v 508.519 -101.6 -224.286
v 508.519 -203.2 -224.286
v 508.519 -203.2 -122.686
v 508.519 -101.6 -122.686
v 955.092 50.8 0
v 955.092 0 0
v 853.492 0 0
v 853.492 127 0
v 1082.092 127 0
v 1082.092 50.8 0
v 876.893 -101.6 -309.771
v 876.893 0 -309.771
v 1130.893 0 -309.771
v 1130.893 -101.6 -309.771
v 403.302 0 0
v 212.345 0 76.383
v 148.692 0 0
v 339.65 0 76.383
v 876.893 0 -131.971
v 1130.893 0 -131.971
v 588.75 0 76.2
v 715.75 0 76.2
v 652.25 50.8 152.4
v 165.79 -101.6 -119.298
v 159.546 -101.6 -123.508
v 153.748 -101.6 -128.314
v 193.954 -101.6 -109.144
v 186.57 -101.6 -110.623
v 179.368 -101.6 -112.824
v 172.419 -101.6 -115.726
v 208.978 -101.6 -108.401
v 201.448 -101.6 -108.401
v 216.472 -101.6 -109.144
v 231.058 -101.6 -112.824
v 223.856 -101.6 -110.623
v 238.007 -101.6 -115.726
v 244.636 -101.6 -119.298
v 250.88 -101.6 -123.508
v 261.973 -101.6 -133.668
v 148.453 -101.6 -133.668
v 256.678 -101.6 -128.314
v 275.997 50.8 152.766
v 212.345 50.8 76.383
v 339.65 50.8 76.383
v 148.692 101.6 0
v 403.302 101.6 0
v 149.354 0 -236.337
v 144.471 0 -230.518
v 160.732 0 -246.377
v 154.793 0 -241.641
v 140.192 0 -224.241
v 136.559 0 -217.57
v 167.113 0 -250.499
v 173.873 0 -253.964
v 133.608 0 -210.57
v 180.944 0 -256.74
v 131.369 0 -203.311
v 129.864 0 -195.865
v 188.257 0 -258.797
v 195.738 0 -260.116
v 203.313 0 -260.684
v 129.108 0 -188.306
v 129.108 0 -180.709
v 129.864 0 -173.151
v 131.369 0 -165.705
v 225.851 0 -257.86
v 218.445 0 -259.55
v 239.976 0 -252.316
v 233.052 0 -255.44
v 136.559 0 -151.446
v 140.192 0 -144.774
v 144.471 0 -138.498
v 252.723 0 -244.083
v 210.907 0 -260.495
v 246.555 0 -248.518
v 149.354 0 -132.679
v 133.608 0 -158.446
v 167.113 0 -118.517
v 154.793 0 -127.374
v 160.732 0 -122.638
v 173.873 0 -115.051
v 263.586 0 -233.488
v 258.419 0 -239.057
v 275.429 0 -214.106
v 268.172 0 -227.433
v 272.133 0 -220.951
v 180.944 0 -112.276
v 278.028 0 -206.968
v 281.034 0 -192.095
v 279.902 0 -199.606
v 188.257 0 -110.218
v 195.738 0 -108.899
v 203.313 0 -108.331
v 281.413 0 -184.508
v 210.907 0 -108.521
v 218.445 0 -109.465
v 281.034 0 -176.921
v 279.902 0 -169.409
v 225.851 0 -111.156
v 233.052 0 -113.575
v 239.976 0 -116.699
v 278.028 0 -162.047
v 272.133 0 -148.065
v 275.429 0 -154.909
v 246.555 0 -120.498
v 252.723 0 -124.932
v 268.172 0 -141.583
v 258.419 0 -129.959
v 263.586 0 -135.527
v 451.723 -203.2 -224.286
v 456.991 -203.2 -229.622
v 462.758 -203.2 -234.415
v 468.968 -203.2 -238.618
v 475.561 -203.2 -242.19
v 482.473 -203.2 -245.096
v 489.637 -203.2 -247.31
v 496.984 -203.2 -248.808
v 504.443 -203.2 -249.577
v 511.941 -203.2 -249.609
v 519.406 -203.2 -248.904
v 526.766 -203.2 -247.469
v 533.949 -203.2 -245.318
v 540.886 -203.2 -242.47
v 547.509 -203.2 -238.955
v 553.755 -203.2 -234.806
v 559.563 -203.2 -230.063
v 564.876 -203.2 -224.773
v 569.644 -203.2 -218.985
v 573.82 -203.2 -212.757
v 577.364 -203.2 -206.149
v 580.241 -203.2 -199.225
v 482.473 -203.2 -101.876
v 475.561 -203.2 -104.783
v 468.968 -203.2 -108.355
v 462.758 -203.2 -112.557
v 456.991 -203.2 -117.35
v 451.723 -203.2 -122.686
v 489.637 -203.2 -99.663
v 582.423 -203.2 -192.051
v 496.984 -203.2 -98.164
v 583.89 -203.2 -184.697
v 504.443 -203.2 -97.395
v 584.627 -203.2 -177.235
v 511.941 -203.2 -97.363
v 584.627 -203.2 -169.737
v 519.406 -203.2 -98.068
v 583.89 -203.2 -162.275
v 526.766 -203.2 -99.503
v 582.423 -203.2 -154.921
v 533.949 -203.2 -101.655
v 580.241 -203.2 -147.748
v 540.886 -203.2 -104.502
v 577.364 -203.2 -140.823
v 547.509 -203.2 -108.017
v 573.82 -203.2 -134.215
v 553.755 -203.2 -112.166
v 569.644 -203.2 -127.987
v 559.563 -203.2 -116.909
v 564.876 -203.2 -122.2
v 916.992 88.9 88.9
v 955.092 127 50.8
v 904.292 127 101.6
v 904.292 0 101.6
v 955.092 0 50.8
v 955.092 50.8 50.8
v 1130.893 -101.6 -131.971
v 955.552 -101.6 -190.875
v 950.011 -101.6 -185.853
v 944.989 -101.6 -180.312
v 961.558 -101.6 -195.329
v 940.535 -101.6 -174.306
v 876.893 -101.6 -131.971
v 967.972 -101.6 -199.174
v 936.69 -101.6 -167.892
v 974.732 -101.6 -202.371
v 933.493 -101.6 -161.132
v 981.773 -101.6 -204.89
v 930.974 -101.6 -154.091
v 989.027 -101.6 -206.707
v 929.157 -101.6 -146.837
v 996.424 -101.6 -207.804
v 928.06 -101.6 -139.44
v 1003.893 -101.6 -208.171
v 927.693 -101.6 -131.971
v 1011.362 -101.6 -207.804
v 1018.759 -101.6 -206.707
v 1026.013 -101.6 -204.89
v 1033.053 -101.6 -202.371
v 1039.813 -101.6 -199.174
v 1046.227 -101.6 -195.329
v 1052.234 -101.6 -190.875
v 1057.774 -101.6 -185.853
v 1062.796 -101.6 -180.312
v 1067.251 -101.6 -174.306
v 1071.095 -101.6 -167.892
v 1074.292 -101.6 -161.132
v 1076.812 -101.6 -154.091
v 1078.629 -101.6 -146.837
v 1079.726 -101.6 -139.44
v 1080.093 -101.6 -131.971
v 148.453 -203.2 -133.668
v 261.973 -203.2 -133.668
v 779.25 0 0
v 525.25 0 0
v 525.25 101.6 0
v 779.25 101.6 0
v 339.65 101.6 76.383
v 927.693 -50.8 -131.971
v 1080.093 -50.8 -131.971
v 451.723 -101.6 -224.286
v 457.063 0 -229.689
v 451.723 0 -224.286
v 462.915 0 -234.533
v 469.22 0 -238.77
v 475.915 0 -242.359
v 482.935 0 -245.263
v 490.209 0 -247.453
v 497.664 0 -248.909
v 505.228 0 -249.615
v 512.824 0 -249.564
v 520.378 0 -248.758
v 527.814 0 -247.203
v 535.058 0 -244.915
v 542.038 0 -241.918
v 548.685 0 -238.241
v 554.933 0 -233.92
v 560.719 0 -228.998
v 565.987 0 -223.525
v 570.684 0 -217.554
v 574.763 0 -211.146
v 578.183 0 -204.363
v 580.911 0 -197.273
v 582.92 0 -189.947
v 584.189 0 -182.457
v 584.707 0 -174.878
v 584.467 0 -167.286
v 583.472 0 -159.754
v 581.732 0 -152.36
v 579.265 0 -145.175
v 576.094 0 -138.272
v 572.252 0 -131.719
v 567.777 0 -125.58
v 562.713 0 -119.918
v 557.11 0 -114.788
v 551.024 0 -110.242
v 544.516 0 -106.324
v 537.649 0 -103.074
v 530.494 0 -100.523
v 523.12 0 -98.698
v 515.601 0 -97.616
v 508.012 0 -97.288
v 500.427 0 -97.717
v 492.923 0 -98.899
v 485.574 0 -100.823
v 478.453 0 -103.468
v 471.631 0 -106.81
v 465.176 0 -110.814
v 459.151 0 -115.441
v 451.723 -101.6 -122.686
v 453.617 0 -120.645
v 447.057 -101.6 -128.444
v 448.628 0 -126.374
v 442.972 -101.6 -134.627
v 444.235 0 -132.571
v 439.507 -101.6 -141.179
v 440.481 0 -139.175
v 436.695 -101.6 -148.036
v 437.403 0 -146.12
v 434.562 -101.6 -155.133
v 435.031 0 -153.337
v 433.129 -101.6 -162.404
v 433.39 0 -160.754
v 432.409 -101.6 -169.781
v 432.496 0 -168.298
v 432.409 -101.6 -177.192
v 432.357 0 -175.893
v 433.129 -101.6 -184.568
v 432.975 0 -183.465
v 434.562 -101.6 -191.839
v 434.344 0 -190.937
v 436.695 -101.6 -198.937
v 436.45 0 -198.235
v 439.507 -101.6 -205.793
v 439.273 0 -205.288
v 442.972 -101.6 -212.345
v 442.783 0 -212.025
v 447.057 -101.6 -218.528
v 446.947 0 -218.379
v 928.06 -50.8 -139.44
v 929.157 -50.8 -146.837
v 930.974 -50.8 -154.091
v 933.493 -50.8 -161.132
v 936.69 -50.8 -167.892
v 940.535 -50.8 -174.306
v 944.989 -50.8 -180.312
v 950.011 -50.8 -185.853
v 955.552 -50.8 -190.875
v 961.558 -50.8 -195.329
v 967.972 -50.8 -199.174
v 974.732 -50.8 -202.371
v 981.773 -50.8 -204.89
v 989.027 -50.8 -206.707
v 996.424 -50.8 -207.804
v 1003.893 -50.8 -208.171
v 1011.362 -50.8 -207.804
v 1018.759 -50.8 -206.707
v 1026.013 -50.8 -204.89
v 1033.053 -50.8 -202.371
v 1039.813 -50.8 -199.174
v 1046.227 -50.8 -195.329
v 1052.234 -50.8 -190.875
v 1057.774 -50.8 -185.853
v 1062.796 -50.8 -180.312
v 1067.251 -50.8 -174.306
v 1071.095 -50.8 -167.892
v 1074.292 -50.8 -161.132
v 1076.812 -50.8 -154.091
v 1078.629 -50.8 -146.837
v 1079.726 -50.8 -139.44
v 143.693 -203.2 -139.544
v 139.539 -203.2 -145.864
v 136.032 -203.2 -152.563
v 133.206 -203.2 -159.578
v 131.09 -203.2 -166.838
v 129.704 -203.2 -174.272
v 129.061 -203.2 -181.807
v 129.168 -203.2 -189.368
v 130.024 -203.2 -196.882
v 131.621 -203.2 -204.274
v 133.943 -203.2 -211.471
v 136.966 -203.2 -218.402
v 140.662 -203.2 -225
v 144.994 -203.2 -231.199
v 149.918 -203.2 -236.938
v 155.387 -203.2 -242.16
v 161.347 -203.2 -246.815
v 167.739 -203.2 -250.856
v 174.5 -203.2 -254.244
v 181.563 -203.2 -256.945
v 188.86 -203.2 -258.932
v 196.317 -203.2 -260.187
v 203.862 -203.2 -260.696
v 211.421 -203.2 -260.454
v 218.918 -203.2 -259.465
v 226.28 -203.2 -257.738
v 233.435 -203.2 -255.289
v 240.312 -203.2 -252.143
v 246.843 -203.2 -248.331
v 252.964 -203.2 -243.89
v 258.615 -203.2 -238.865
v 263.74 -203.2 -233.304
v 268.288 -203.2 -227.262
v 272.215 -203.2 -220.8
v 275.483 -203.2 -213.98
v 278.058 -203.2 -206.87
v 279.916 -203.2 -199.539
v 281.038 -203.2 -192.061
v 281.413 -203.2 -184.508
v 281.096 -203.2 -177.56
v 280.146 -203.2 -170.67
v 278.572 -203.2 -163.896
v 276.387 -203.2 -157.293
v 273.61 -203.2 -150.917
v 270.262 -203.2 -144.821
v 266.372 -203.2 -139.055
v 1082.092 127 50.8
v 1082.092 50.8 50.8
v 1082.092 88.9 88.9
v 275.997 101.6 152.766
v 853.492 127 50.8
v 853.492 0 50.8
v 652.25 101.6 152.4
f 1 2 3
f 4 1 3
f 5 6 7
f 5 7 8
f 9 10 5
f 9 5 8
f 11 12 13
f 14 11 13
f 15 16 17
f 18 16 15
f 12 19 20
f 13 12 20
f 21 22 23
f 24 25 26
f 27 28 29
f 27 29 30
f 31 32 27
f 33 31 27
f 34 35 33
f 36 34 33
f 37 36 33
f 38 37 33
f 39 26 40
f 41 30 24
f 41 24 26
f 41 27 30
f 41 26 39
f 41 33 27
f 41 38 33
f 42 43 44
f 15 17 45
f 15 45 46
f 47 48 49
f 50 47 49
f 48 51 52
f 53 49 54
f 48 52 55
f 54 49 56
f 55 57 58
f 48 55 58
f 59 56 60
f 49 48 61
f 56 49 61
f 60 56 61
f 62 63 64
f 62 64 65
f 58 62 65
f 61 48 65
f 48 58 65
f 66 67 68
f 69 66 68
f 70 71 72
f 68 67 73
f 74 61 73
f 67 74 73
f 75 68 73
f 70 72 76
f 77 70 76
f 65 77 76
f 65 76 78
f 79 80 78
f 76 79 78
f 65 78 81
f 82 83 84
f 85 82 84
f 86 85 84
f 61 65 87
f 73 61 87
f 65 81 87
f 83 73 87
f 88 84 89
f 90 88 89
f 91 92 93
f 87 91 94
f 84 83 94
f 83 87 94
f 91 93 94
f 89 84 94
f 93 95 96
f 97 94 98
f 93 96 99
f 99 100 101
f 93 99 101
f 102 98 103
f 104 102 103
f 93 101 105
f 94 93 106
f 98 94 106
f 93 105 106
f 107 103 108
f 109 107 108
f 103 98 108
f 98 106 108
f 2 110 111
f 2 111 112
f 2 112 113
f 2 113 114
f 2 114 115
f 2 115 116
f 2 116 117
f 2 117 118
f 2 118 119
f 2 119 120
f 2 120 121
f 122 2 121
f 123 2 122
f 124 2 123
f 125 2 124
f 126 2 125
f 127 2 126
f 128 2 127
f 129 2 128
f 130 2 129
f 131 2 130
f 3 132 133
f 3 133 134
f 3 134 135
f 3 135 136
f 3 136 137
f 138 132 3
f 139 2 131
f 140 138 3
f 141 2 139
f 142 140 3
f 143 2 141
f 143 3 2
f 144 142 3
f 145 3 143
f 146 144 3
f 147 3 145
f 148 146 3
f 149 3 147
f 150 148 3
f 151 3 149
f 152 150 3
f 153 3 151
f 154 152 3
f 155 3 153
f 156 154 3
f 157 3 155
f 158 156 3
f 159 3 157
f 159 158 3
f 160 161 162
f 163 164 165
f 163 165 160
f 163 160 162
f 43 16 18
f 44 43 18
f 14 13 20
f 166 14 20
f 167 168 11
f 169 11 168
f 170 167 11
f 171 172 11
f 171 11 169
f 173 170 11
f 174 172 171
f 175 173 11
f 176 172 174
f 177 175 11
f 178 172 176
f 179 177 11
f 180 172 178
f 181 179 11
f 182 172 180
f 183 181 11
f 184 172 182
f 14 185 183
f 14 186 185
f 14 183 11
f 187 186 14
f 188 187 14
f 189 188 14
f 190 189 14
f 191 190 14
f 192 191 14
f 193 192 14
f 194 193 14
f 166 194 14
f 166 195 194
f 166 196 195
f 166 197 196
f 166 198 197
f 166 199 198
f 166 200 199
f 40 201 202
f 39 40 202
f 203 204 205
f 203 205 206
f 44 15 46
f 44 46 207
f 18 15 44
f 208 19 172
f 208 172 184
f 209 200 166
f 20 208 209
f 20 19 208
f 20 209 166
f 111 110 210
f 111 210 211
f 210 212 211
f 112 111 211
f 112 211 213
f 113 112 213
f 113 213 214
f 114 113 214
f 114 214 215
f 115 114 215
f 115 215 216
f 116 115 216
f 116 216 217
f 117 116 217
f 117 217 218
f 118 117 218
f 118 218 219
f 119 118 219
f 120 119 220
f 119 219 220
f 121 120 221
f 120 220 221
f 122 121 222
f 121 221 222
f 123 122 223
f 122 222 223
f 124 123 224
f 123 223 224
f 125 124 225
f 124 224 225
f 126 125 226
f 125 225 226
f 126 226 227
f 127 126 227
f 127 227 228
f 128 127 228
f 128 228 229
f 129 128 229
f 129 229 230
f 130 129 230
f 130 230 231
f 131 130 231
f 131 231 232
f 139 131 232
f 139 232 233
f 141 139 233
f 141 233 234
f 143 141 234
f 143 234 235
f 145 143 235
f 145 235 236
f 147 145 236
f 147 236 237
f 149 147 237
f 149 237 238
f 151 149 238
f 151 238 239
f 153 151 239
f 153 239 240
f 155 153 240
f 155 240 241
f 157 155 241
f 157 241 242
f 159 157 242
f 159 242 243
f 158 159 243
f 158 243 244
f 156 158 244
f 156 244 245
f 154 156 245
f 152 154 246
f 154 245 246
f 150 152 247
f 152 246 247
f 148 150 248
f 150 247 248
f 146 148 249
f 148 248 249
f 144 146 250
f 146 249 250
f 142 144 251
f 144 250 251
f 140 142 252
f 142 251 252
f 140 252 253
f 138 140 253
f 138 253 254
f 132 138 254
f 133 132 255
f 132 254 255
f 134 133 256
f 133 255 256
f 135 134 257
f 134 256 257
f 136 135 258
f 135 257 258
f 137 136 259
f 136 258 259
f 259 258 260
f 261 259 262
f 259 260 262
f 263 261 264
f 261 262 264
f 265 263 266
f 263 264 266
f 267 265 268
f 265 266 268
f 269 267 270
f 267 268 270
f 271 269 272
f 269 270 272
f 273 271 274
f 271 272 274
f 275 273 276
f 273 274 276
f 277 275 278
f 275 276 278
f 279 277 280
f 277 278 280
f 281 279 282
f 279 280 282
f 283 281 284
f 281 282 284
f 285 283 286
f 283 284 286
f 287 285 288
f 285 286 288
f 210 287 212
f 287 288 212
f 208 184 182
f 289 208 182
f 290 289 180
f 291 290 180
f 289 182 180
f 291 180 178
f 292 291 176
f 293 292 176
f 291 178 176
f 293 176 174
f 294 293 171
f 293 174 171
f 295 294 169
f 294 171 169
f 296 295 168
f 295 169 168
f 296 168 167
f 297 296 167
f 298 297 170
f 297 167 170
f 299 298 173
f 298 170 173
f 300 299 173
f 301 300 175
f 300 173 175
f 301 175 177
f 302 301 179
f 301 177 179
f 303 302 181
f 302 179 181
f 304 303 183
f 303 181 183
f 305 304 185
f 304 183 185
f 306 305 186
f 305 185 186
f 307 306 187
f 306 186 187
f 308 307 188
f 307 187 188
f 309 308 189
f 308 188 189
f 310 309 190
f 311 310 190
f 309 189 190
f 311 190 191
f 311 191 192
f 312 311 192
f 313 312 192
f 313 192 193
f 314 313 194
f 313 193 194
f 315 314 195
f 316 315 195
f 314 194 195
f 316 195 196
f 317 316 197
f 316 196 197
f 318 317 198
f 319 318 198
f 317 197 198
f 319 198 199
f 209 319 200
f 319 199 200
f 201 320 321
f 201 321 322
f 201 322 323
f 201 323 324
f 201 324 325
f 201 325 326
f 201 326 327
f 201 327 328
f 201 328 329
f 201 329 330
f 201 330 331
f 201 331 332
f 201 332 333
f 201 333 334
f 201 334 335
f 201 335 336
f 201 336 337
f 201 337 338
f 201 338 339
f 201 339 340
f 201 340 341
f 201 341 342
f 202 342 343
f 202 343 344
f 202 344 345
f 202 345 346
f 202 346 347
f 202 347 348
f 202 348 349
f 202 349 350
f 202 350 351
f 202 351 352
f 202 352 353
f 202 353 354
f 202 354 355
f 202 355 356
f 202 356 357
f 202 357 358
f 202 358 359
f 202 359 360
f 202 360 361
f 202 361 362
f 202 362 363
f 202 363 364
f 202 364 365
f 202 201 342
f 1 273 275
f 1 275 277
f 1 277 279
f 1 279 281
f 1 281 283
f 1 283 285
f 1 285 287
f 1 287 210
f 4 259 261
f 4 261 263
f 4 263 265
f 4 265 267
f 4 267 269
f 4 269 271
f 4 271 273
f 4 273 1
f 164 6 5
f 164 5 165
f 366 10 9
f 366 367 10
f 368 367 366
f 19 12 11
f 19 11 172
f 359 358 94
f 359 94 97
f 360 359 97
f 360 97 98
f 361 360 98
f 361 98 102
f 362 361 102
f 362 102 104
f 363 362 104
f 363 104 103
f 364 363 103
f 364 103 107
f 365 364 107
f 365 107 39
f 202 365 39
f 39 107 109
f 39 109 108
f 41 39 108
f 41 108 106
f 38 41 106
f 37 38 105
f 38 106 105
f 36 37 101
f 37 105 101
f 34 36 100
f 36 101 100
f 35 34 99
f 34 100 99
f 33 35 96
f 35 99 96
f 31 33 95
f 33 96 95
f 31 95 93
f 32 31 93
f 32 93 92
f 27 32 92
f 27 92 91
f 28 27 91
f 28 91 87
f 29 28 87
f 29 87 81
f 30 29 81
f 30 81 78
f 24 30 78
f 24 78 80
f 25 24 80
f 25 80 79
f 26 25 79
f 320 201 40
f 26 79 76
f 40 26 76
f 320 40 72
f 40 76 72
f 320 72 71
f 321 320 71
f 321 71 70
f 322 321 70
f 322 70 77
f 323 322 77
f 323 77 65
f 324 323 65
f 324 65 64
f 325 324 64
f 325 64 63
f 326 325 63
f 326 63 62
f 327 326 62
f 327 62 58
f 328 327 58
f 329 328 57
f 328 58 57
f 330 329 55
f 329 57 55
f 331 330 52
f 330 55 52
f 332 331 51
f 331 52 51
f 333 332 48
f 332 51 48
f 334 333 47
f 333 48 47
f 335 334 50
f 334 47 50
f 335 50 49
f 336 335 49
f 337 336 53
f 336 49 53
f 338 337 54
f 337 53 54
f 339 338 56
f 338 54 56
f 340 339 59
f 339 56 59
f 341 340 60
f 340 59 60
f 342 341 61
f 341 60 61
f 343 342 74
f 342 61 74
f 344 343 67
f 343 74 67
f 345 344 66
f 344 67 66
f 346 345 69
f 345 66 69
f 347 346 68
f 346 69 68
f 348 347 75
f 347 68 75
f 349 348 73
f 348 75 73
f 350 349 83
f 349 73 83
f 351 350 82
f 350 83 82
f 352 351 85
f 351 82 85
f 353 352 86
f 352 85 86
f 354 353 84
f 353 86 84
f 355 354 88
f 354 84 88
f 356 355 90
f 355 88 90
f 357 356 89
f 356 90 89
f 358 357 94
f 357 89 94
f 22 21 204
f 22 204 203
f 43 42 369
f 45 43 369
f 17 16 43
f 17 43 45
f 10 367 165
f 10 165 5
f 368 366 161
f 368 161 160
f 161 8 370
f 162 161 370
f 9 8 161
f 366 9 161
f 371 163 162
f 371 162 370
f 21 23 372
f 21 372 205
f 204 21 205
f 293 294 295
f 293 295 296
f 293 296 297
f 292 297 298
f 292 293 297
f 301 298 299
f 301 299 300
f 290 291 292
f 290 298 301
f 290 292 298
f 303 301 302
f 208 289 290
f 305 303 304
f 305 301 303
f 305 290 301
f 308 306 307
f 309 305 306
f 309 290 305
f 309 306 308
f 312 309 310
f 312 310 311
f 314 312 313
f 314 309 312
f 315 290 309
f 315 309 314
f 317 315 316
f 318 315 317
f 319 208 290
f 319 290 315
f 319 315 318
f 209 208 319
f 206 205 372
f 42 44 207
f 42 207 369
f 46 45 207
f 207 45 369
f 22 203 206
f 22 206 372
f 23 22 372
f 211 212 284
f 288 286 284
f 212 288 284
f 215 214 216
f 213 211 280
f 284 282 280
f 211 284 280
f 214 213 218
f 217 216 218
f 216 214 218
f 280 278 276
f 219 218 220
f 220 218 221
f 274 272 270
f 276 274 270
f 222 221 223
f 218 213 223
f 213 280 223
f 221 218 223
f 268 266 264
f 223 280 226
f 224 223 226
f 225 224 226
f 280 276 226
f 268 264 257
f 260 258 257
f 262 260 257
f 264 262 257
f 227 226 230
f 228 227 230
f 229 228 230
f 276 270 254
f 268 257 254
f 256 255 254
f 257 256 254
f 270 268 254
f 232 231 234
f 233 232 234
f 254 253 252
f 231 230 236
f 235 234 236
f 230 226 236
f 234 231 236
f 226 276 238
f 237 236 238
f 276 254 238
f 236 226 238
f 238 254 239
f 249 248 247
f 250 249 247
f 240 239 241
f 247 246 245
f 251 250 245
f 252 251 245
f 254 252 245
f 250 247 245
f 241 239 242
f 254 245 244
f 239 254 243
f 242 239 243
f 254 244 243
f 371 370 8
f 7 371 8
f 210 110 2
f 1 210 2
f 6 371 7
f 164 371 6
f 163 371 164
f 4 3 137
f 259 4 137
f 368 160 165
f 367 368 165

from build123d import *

# Parameters (mm, degrees)
F1_DEPTH  = 101.6
F2_DEPTH  = 50.8
F3_DEPTH  = 101.6
F7_DEPTH  = 63.5
F9_DEPTH  = 127
F12_DEPTH = 165.1
F13_R     = 76.2
F14_DEPTH = 203.2
F16_DEPTH = 101.6
F18_DEPTH = 203.2
F20_DEPTH = 101.6
F21_W     = 254
F21_H     = 177.8
F22_DEPTH = 101.6
F24_DEPTH = 50.8


with BuildPart() as f1:
    # F0 (on Front) → F1 (new body)
    with BuildSketch(Plane.XZ):
        Polygon((275.9973074218, 152.7659382395), (212.3448331553, 76.3829691198), (339.6497816883, 76.3829691198), align=None)
        Polygon((212.3448331553, 76.3829691198), (148.6923588888, 0), (403.3022559547, 0), (339.6497816883, 76.3829691198), align=None)
    extrude(amount=-F1_DEPTH)

    # F0 (on Front) → F2 (cut)
    with BuildSketch(Plane.XZ):
        Polygon((275.9973074218, 152.7659382395), (212.3448331553, 76.3829691198), (339.6497816883, 76.3829691198), align=None)
    extrude(amount=-F2_DEPTH, mode=Mode.SUBTRACT)


with BuildPart() as f3:
    # F0 (on Front) → F3 (new body)
    with BuildSketch(Plane.XZ):
        Polygon((652.2500761549, 152.4), (588.7500761549, 76.2), (715.7500761549, 76.2), align=None)
        Polygon((588.7500761549, 76.2), (525.2500761549, 0), (779.2500761549, 0), (715.7500761549, 76.2), align=None)
    extrude(amount=-F3_DEPTH)

    # F6 (on 3pt) → F7 (cut, symmetric)
    with BuildSketch(Plane.YZ.offset(652.2500761549)):
        Polygon((0, 152.4), (0, 76.2), (50.8, 152.4), align=None)
    extrude(amount=F7_DEPTH, both=True, mode=Mode.SUBTRACT)


with BuildPart() as f9:
    # F8 (on Front) → F9 (new body)
    with BuildSketch(Plane.XZ):
        Polygon((853.4919664163, 50.8), (853.4919664163, 0), (955.0919664163, 0), (955.0919664163, 50.8), (904.2919664163, 101.6), align=None)
    extrude(amount=-F9_DEPTH)

    # F11 (on offset) → F12 (join)
    with BuildSketch(Plane.YZ.offset(1082.0919664163)):
        Polygon((50.8, 0), (127, 0), (127, 50.8), (88.9, 88.9), (50.8, 50.8), align=None)
    extrude(amount=-F12_DEPTH)


with BuildPart() as f14:
    # F13 (on Front) → F14 (new body)
    with BuildSketch(Plane.XZ):
        with Locations((205.21299541, -184.5077127218)):
            Circle(F13_R)
    extrude(amount=F14_DEPTH)

    # F15 (on face) → F16 (cut)
    with BuildSketch(Plane.XZ.offset(203.2)):
        with BuildLine():
            Line((148.4525080283, -133.667894939), (202.7499394524, -133.667894939))
            Line((202.7499394524, -133.667894939), (261.9734827917, -133.667894939))
            ThreePointArc((261.9734827917, -133.667894939), (205.21299541, -108.3077127218), (148.4525080283, -133.667894939))
        make_face()
    extrude(amount=-F16_DEPTH, mode=Mode.SUBTRACT)


with BuildPart() as f18:
    # F17 (on Front) → F18 (new body)
    with BuildSketch(Plane.XZ):
        with BuildLine():
            ThreePointArc((451.7231056446, -224.286083746), (535.7090755138, -244.6700174989), (584.7192322731, -173.486083746))
            ThreePointArc((584.7192322731, -173.486083746), (535.7090755138, -102.302149993), (451.7231056446, -122.686083746))
            Line((451.7231056446, -122.686083746), (508.5192322731, -122.686083746))
            Line((508.5192322731, -122.686083746), (508.5192322731, -224.286083746))
            Line((508.5192322731, -224.286083746), (451.7231056446, -224.286083746))
        make_face()
        with BuildLine():
            Line((508.5192322731, -122.686083746), (451.7231056446, -122.686083746))
            ThreePointArc((451.7231056446, -122.686083746), (432.3192322731, -173.486083746), (451.7231056446, -224.286083746))
            Line((451.7231056446, -224.286083746), (508.5192322731, -224.286083746))
            Line((508.5192322731, -224.286083746), (508.5192322731, -122.686083746))
        make_face()
    extrude(amount=F18_DEPTH)

    # F19 (on face) → F20 (cut)
    with BuildSketch(Plane.XZ.offset(203.2)):
        with BuildLine():
            Line((508.5192322731, -224.286083746), (508.5192322731, -122.686083746))
            Line((508.5192322731, -122.686083746), (451.7231056446, -122.686083746))
            ThreePointArc((451.7231056446, -122.686083746), (432.3192322731, -173.486083746), (451.7231056446, -224.286083746))
            Line((451.7231056446, -224.286083746), (508.5192322731, -224.286083746))
        make_face()
    extrude(amount=-F20_DEPTH, mode=Mode.SUBTRACT)


with BuildPart() as f22:
    # F21 (on Front) → F22 (new body)
    with BuildSketch(Plane.XZ):
        with Locations((1003.8928091526, -220.871200853)):
            Rectangle(F21_W, F21_H)
    extrude(amount=F22_DEPTH)

    # F23 (on face) → F24 (cut)
    with BuildSketch(Plane.XZ.offset(101.6)):
        with BuildLine():
            Line((1080.0928091526, -131.971200853), (927.6928091526, -131.971200853))
            ThreePointArc((927.6928091526, -131.971200853), (1003.8928091526, -208.171200853), (1080.0928091526, -131.971200853))
        make_face()
    extrude(amount=-F24_DEPTH, mode=Mode.SUBTRACT)


solid = Compound([f1.part, f3.part, f9.part, f14.part, f18.part, f22.part])
